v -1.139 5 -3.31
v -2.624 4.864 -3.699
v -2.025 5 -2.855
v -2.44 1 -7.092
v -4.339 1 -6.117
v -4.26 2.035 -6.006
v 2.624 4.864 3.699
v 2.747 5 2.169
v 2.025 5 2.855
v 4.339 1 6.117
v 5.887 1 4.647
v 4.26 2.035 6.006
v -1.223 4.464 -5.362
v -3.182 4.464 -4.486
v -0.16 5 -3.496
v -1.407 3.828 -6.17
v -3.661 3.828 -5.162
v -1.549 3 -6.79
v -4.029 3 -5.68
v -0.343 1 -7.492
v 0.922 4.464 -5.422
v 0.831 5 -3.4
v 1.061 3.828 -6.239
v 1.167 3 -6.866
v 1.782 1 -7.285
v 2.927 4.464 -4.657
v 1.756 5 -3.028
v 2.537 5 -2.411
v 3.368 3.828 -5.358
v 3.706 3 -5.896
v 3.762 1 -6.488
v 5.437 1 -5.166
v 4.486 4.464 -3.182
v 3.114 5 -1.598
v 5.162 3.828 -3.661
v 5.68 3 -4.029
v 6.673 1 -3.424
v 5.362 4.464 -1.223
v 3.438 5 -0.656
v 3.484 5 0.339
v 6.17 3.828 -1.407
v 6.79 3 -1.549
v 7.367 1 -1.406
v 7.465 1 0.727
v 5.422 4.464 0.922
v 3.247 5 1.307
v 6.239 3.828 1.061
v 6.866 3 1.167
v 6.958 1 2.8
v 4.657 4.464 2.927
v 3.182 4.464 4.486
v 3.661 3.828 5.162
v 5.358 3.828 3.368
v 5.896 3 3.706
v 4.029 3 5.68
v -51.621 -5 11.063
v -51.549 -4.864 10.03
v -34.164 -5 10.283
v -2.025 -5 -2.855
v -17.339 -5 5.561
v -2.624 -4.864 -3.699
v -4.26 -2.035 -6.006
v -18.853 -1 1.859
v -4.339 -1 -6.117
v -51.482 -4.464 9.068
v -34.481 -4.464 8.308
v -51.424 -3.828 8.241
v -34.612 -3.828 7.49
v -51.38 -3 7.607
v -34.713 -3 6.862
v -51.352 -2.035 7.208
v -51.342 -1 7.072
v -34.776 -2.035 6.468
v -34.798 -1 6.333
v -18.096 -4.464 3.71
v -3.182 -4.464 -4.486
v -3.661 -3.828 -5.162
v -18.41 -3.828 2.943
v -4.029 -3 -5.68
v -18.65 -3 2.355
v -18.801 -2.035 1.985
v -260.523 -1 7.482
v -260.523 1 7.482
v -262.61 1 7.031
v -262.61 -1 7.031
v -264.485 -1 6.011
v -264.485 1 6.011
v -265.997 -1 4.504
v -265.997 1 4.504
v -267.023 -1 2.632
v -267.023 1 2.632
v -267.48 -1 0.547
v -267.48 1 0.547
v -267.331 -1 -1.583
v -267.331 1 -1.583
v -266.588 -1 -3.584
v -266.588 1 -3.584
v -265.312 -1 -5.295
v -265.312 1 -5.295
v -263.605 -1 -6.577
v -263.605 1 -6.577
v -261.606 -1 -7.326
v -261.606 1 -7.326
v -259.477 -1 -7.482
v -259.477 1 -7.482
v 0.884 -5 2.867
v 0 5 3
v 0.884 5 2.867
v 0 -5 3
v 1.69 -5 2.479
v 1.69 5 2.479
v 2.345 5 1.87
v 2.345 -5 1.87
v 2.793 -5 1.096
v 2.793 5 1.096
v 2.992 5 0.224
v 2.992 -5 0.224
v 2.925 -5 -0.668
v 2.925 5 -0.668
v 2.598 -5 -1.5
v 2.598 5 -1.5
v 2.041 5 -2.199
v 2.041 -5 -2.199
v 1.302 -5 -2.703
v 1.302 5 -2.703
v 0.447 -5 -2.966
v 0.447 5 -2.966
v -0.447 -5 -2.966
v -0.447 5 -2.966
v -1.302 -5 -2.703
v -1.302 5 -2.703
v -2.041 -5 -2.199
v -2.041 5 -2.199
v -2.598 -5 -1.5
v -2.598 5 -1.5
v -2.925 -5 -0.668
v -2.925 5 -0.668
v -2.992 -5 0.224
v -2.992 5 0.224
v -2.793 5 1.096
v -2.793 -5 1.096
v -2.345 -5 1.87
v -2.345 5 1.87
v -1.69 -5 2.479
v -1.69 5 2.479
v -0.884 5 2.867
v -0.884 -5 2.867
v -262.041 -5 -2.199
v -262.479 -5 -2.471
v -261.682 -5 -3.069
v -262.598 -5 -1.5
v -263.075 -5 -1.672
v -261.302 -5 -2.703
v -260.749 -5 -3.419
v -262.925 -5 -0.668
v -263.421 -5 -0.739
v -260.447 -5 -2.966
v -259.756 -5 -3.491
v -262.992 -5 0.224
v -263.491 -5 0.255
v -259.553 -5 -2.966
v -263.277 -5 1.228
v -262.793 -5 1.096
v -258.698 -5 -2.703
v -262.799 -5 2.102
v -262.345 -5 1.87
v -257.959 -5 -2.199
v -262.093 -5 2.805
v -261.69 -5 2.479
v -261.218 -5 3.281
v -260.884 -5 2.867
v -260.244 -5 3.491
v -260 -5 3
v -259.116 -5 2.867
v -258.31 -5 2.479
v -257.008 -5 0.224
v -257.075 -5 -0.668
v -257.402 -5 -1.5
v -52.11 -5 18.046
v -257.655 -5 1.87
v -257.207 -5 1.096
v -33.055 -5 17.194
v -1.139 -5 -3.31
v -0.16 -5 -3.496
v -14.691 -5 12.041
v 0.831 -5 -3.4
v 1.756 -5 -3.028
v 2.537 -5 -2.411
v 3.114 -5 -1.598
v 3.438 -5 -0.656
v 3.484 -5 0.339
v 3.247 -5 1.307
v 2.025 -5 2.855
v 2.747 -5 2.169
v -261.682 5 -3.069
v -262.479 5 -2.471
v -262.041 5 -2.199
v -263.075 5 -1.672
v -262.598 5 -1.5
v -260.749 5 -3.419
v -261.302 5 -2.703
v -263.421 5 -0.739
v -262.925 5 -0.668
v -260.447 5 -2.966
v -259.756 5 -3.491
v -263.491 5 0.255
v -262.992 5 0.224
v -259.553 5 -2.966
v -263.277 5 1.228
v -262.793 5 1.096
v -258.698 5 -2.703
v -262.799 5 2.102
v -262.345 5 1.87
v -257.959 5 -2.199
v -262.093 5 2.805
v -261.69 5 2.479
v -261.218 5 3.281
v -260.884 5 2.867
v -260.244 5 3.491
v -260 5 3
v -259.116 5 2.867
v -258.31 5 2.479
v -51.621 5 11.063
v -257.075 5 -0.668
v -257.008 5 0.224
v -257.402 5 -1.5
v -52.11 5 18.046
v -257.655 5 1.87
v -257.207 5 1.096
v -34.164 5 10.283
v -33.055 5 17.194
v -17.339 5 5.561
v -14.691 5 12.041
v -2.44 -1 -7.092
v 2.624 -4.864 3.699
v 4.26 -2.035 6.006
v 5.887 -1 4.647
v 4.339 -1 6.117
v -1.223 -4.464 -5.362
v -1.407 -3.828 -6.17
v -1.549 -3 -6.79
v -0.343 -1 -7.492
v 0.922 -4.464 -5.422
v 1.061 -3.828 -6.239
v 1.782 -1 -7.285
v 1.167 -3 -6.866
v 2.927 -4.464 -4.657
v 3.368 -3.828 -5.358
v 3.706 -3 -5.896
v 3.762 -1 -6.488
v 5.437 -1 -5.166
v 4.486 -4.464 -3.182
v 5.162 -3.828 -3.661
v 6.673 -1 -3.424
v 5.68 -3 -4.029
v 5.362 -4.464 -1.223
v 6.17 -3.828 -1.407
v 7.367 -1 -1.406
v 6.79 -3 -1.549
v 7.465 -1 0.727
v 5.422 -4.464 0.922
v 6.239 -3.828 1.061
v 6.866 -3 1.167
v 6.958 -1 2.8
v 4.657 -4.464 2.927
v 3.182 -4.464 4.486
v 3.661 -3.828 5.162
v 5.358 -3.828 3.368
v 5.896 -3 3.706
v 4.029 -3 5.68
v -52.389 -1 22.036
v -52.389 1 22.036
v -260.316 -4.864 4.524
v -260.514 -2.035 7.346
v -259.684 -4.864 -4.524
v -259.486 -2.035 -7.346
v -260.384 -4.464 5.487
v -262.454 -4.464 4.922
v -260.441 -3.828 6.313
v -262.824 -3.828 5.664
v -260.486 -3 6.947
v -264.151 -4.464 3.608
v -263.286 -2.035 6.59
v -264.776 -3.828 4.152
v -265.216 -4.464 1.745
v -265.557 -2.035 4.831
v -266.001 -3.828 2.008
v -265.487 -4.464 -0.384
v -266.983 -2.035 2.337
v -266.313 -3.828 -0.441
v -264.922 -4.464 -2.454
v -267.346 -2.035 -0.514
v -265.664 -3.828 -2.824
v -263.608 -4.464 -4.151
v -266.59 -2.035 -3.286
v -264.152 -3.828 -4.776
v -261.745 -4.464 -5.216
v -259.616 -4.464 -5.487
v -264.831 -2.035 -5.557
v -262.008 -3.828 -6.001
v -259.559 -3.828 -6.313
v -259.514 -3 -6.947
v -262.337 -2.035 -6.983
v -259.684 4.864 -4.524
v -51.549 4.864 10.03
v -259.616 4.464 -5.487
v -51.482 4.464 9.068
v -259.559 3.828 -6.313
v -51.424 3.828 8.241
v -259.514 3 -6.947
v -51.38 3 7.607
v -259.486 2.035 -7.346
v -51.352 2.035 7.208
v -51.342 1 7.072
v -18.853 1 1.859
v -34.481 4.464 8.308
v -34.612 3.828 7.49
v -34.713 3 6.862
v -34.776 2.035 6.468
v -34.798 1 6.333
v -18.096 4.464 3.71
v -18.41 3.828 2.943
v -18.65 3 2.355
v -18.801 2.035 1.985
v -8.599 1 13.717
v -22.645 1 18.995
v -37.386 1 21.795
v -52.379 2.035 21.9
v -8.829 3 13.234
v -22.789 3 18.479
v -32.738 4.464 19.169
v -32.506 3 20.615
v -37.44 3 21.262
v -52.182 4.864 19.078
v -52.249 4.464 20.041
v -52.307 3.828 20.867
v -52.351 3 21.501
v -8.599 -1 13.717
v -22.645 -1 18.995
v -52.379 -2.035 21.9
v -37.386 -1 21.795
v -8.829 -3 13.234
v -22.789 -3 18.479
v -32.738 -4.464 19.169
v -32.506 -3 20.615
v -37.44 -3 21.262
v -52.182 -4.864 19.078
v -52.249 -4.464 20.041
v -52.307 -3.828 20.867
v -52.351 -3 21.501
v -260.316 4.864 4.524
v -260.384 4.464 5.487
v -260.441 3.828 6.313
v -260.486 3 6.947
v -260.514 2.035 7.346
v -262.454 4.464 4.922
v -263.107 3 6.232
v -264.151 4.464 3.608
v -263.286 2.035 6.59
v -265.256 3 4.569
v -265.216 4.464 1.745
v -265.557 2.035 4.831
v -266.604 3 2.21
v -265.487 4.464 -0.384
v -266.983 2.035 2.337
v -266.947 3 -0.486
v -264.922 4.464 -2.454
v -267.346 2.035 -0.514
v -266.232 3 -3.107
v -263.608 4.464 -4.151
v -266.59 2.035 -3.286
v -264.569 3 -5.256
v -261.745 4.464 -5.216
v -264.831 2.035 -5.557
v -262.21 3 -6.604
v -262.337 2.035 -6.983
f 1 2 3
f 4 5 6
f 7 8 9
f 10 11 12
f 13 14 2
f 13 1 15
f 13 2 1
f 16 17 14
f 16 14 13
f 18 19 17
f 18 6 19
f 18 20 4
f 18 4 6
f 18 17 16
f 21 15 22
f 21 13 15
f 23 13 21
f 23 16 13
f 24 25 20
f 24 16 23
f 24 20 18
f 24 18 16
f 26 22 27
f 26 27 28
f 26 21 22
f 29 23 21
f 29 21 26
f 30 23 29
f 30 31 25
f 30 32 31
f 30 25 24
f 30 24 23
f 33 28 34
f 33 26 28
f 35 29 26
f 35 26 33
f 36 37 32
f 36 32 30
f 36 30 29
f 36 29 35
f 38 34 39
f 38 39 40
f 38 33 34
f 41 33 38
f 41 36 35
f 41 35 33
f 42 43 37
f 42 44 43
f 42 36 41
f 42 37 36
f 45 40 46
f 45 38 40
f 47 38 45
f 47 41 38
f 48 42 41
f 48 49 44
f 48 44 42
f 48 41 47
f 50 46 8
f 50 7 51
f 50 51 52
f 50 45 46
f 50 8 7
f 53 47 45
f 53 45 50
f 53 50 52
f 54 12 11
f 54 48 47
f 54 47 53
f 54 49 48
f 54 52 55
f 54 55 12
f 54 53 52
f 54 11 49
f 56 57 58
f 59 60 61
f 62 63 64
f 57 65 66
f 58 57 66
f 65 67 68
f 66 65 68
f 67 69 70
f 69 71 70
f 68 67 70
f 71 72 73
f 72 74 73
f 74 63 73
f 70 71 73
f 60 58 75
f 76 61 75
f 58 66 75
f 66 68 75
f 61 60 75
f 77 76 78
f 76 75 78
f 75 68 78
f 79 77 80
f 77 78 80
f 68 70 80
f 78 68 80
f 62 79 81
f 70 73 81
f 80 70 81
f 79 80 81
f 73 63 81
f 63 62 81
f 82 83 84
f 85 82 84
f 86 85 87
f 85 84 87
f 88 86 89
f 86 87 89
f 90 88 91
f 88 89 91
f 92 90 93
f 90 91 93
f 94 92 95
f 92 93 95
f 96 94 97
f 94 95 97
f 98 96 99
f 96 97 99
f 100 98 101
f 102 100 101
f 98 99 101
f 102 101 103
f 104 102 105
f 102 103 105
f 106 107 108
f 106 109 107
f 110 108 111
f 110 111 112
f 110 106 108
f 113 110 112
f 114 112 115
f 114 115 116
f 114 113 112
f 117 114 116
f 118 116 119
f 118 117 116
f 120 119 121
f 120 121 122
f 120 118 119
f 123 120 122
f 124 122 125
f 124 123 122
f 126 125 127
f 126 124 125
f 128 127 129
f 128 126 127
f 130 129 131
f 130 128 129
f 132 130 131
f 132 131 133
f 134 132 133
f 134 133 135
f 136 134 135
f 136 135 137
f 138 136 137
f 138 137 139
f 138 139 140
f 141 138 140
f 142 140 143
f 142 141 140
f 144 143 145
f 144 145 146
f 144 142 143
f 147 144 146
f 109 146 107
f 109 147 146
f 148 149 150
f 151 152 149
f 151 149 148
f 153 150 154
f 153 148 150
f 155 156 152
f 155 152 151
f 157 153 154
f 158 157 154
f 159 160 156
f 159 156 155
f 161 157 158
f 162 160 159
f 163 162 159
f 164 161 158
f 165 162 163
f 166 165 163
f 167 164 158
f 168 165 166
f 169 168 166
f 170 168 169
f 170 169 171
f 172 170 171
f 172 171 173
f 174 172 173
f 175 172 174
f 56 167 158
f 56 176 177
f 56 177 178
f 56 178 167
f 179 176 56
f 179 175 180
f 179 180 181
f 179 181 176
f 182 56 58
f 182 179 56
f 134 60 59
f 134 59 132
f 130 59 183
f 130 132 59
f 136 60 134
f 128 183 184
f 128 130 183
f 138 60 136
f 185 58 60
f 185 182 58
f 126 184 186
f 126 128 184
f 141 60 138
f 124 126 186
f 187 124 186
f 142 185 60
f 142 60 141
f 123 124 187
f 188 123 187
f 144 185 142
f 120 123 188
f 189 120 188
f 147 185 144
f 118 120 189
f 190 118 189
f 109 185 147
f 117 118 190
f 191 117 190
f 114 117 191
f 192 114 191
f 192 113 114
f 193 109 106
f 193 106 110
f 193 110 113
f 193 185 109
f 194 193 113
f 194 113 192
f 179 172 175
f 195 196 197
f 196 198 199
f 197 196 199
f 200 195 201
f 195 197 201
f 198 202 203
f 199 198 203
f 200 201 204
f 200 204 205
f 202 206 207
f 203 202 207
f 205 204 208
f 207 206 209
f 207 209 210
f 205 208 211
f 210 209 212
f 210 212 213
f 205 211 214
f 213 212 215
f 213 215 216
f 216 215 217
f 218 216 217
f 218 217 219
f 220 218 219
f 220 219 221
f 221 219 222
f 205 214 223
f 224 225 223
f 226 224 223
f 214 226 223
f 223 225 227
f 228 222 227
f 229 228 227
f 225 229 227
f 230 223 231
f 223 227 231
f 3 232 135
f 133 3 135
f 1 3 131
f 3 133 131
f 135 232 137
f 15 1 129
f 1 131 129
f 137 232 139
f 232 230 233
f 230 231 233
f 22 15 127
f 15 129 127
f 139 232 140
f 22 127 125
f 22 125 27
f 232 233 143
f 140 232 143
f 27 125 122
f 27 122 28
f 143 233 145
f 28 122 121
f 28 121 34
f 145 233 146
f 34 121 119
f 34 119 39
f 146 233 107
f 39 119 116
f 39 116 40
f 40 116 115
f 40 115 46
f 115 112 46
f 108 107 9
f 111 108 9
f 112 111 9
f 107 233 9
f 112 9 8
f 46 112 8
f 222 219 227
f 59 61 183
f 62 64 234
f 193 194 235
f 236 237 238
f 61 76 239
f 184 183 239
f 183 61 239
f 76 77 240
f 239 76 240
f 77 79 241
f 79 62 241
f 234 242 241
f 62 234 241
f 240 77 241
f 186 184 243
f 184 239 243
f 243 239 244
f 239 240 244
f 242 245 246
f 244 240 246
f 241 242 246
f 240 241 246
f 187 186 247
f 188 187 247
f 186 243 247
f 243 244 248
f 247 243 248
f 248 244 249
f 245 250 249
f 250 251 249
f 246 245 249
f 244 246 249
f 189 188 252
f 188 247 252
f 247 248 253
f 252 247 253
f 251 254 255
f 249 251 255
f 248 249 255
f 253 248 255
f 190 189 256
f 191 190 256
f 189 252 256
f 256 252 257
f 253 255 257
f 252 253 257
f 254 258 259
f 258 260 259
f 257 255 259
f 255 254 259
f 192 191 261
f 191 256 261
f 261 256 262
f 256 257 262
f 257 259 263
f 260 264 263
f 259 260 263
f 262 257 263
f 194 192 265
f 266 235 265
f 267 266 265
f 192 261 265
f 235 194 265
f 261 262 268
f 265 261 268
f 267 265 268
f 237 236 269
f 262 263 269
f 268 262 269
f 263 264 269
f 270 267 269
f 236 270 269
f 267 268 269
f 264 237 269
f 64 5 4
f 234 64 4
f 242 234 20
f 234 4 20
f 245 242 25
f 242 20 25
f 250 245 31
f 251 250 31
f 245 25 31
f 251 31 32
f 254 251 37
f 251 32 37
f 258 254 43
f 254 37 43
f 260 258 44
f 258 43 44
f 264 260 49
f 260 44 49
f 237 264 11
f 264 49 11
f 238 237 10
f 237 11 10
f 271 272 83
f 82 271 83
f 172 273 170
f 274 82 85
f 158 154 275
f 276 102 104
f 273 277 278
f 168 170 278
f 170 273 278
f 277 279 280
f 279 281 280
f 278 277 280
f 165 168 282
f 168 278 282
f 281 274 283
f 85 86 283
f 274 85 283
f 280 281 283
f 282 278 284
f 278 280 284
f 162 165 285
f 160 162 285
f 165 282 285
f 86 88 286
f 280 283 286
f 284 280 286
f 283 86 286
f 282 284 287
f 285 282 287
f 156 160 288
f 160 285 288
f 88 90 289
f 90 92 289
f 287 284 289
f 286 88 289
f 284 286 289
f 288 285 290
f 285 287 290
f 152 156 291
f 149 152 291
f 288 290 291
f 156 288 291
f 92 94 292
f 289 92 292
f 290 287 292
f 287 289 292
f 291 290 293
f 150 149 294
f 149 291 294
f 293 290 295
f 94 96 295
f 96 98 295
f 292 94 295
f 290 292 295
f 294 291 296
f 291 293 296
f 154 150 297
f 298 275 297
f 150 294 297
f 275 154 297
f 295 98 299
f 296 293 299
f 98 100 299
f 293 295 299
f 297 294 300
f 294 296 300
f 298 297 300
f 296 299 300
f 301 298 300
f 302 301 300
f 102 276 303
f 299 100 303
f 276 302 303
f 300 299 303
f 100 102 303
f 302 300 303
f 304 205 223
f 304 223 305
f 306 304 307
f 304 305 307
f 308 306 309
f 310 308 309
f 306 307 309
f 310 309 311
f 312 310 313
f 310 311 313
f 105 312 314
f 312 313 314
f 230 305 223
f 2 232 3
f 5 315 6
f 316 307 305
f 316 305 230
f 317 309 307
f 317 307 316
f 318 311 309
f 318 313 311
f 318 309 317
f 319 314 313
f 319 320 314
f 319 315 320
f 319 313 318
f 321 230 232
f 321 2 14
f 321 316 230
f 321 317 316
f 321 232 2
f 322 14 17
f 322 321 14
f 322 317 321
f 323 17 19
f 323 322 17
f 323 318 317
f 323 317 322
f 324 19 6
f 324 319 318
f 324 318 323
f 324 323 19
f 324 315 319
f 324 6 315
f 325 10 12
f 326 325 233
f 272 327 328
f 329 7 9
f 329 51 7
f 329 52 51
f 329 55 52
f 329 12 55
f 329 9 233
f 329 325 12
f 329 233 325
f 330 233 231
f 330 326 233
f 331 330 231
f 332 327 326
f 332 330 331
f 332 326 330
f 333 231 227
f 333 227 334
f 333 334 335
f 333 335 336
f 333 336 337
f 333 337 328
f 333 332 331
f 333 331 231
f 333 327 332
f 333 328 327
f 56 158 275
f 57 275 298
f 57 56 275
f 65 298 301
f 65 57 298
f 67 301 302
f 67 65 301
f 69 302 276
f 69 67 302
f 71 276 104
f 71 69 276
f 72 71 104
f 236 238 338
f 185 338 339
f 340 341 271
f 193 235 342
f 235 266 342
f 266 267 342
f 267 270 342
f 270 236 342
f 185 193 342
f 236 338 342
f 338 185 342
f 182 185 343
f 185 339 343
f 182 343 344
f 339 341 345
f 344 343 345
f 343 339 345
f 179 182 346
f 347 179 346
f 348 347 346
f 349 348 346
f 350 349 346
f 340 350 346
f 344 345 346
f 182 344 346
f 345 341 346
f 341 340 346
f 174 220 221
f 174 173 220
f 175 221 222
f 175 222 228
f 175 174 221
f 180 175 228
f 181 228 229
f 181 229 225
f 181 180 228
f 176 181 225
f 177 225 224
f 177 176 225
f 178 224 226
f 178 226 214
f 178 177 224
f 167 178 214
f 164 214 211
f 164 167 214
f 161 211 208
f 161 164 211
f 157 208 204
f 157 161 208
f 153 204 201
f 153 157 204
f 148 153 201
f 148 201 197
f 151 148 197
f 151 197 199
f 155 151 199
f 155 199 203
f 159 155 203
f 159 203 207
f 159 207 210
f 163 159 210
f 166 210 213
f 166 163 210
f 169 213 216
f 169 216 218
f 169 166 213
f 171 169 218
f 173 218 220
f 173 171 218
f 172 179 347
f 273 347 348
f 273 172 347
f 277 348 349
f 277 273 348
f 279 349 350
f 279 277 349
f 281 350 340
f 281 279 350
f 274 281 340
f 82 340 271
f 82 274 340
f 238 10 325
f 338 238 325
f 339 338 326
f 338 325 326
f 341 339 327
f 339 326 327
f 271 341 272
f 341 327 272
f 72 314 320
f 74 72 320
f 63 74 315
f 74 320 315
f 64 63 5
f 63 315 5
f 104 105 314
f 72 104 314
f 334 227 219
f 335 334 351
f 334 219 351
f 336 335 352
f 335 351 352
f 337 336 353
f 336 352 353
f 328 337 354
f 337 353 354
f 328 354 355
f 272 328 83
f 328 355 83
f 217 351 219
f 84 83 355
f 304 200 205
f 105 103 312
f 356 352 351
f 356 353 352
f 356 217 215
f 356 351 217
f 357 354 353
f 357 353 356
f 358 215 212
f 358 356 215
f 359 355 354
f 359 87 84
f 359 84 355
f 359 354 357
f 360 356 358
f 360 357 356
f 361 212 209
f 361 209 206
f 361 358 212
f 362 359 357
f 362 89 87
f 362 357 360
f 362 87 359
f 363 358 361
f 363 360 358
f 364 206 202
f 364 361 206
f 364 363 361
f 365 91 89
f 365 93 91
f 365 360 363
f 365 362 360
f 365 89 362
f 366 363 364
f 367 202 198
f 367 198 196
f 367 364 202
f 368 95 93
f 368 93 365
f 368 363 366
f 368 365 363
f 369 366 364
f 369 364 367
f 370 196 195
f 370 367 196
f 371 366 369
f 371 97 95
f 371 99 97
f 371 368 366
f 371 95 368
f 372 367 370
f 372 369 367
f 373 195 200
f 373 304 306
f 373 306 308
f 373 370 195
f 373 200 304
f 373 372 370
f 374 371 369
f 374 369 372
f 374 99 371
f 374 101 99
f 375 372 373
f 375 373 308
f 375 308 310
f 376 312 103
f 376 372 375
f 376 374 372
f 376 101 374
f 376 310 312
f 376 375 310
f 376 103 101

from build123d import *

# Parameters (mm, degrees)
CROQUIS1_R              = 3
SALIENTE_EXTRUIR1_DEPTH = 5
REDONDEO7_R             = 4


with BuildPart() as part:
    # Croquis1 → Saliente-Extruir1 (new, symmetric)
    with BuildSketch(Plane(origin=(0, 0, 0), x_dir=(-1, 0, 0), z_dir=(0, 1, 0))):
        with BuildLine():
            Line((52.388821078, 22.035902101), (260.523173553, 7.481730377))
            ThreePointArc((260.523173553, 7.481730377), (267.481730377, -0.523173553), (259.476826447, -7.481730377))
            Line((259.476826447, -7.481730377), (51.342473972, 7.072441348))
            ThreePointArc((51.342473972, 7.072441348), (26.697288319, 4.552818898), (4.339230902, -6.117276778))
            ThreePointArc((4.339230902, -6.117276778), (-6.117276778, -4.339230902), (-4.339230902, 6.117276778))
            ThreePointArc((-4.339230902, 6.117276778), (22.644631497, 18.994978455), (52.388821078, 22.035902101))
        make_face()
        with Locations(Location((0, 0, 0), (0, 0, 90))):
            Circle(CROQUIS1_R, mode=Mode.SUBTRACT)
        with Locations(Location((260, 0, 0), (0, 0, 90))):
            Circle(CROQUIS1_R, mode=Mode.SUBTRACT)
    extrude(amount=SALIENTE_EXTRUIR1_DEPTH, both=True)

    # Redondeo7
    redondeo7_edges = [part.edges().sort_by_distance(p)[0] for p in [
        (-155.409650209, 5, -0.204644515),
        (-267.481730377, 5, -0.523173553),
        (-156.455997315, 5, 14.758816239),
        (-22.644631497, 5, 18.994978455),
        (6.117276778, 5, -4.339230902),
        (-22.644631497, -5, 18.994978455),
        (-156.455997315, -5, 14.758816239),
        (-267.481730377, -5, -0.523173553),
        (-155.409650209, -5, -0.204644515),
        (-26.697288319, -5, 4.552818898),
        (6.117276778, -5, -4.339230902),
        (-26.697288319, 5, 4.552818898),
    ]]
    fillet(redondeo7_edges, radius=REDONDEO7_R)


solid = part.part
